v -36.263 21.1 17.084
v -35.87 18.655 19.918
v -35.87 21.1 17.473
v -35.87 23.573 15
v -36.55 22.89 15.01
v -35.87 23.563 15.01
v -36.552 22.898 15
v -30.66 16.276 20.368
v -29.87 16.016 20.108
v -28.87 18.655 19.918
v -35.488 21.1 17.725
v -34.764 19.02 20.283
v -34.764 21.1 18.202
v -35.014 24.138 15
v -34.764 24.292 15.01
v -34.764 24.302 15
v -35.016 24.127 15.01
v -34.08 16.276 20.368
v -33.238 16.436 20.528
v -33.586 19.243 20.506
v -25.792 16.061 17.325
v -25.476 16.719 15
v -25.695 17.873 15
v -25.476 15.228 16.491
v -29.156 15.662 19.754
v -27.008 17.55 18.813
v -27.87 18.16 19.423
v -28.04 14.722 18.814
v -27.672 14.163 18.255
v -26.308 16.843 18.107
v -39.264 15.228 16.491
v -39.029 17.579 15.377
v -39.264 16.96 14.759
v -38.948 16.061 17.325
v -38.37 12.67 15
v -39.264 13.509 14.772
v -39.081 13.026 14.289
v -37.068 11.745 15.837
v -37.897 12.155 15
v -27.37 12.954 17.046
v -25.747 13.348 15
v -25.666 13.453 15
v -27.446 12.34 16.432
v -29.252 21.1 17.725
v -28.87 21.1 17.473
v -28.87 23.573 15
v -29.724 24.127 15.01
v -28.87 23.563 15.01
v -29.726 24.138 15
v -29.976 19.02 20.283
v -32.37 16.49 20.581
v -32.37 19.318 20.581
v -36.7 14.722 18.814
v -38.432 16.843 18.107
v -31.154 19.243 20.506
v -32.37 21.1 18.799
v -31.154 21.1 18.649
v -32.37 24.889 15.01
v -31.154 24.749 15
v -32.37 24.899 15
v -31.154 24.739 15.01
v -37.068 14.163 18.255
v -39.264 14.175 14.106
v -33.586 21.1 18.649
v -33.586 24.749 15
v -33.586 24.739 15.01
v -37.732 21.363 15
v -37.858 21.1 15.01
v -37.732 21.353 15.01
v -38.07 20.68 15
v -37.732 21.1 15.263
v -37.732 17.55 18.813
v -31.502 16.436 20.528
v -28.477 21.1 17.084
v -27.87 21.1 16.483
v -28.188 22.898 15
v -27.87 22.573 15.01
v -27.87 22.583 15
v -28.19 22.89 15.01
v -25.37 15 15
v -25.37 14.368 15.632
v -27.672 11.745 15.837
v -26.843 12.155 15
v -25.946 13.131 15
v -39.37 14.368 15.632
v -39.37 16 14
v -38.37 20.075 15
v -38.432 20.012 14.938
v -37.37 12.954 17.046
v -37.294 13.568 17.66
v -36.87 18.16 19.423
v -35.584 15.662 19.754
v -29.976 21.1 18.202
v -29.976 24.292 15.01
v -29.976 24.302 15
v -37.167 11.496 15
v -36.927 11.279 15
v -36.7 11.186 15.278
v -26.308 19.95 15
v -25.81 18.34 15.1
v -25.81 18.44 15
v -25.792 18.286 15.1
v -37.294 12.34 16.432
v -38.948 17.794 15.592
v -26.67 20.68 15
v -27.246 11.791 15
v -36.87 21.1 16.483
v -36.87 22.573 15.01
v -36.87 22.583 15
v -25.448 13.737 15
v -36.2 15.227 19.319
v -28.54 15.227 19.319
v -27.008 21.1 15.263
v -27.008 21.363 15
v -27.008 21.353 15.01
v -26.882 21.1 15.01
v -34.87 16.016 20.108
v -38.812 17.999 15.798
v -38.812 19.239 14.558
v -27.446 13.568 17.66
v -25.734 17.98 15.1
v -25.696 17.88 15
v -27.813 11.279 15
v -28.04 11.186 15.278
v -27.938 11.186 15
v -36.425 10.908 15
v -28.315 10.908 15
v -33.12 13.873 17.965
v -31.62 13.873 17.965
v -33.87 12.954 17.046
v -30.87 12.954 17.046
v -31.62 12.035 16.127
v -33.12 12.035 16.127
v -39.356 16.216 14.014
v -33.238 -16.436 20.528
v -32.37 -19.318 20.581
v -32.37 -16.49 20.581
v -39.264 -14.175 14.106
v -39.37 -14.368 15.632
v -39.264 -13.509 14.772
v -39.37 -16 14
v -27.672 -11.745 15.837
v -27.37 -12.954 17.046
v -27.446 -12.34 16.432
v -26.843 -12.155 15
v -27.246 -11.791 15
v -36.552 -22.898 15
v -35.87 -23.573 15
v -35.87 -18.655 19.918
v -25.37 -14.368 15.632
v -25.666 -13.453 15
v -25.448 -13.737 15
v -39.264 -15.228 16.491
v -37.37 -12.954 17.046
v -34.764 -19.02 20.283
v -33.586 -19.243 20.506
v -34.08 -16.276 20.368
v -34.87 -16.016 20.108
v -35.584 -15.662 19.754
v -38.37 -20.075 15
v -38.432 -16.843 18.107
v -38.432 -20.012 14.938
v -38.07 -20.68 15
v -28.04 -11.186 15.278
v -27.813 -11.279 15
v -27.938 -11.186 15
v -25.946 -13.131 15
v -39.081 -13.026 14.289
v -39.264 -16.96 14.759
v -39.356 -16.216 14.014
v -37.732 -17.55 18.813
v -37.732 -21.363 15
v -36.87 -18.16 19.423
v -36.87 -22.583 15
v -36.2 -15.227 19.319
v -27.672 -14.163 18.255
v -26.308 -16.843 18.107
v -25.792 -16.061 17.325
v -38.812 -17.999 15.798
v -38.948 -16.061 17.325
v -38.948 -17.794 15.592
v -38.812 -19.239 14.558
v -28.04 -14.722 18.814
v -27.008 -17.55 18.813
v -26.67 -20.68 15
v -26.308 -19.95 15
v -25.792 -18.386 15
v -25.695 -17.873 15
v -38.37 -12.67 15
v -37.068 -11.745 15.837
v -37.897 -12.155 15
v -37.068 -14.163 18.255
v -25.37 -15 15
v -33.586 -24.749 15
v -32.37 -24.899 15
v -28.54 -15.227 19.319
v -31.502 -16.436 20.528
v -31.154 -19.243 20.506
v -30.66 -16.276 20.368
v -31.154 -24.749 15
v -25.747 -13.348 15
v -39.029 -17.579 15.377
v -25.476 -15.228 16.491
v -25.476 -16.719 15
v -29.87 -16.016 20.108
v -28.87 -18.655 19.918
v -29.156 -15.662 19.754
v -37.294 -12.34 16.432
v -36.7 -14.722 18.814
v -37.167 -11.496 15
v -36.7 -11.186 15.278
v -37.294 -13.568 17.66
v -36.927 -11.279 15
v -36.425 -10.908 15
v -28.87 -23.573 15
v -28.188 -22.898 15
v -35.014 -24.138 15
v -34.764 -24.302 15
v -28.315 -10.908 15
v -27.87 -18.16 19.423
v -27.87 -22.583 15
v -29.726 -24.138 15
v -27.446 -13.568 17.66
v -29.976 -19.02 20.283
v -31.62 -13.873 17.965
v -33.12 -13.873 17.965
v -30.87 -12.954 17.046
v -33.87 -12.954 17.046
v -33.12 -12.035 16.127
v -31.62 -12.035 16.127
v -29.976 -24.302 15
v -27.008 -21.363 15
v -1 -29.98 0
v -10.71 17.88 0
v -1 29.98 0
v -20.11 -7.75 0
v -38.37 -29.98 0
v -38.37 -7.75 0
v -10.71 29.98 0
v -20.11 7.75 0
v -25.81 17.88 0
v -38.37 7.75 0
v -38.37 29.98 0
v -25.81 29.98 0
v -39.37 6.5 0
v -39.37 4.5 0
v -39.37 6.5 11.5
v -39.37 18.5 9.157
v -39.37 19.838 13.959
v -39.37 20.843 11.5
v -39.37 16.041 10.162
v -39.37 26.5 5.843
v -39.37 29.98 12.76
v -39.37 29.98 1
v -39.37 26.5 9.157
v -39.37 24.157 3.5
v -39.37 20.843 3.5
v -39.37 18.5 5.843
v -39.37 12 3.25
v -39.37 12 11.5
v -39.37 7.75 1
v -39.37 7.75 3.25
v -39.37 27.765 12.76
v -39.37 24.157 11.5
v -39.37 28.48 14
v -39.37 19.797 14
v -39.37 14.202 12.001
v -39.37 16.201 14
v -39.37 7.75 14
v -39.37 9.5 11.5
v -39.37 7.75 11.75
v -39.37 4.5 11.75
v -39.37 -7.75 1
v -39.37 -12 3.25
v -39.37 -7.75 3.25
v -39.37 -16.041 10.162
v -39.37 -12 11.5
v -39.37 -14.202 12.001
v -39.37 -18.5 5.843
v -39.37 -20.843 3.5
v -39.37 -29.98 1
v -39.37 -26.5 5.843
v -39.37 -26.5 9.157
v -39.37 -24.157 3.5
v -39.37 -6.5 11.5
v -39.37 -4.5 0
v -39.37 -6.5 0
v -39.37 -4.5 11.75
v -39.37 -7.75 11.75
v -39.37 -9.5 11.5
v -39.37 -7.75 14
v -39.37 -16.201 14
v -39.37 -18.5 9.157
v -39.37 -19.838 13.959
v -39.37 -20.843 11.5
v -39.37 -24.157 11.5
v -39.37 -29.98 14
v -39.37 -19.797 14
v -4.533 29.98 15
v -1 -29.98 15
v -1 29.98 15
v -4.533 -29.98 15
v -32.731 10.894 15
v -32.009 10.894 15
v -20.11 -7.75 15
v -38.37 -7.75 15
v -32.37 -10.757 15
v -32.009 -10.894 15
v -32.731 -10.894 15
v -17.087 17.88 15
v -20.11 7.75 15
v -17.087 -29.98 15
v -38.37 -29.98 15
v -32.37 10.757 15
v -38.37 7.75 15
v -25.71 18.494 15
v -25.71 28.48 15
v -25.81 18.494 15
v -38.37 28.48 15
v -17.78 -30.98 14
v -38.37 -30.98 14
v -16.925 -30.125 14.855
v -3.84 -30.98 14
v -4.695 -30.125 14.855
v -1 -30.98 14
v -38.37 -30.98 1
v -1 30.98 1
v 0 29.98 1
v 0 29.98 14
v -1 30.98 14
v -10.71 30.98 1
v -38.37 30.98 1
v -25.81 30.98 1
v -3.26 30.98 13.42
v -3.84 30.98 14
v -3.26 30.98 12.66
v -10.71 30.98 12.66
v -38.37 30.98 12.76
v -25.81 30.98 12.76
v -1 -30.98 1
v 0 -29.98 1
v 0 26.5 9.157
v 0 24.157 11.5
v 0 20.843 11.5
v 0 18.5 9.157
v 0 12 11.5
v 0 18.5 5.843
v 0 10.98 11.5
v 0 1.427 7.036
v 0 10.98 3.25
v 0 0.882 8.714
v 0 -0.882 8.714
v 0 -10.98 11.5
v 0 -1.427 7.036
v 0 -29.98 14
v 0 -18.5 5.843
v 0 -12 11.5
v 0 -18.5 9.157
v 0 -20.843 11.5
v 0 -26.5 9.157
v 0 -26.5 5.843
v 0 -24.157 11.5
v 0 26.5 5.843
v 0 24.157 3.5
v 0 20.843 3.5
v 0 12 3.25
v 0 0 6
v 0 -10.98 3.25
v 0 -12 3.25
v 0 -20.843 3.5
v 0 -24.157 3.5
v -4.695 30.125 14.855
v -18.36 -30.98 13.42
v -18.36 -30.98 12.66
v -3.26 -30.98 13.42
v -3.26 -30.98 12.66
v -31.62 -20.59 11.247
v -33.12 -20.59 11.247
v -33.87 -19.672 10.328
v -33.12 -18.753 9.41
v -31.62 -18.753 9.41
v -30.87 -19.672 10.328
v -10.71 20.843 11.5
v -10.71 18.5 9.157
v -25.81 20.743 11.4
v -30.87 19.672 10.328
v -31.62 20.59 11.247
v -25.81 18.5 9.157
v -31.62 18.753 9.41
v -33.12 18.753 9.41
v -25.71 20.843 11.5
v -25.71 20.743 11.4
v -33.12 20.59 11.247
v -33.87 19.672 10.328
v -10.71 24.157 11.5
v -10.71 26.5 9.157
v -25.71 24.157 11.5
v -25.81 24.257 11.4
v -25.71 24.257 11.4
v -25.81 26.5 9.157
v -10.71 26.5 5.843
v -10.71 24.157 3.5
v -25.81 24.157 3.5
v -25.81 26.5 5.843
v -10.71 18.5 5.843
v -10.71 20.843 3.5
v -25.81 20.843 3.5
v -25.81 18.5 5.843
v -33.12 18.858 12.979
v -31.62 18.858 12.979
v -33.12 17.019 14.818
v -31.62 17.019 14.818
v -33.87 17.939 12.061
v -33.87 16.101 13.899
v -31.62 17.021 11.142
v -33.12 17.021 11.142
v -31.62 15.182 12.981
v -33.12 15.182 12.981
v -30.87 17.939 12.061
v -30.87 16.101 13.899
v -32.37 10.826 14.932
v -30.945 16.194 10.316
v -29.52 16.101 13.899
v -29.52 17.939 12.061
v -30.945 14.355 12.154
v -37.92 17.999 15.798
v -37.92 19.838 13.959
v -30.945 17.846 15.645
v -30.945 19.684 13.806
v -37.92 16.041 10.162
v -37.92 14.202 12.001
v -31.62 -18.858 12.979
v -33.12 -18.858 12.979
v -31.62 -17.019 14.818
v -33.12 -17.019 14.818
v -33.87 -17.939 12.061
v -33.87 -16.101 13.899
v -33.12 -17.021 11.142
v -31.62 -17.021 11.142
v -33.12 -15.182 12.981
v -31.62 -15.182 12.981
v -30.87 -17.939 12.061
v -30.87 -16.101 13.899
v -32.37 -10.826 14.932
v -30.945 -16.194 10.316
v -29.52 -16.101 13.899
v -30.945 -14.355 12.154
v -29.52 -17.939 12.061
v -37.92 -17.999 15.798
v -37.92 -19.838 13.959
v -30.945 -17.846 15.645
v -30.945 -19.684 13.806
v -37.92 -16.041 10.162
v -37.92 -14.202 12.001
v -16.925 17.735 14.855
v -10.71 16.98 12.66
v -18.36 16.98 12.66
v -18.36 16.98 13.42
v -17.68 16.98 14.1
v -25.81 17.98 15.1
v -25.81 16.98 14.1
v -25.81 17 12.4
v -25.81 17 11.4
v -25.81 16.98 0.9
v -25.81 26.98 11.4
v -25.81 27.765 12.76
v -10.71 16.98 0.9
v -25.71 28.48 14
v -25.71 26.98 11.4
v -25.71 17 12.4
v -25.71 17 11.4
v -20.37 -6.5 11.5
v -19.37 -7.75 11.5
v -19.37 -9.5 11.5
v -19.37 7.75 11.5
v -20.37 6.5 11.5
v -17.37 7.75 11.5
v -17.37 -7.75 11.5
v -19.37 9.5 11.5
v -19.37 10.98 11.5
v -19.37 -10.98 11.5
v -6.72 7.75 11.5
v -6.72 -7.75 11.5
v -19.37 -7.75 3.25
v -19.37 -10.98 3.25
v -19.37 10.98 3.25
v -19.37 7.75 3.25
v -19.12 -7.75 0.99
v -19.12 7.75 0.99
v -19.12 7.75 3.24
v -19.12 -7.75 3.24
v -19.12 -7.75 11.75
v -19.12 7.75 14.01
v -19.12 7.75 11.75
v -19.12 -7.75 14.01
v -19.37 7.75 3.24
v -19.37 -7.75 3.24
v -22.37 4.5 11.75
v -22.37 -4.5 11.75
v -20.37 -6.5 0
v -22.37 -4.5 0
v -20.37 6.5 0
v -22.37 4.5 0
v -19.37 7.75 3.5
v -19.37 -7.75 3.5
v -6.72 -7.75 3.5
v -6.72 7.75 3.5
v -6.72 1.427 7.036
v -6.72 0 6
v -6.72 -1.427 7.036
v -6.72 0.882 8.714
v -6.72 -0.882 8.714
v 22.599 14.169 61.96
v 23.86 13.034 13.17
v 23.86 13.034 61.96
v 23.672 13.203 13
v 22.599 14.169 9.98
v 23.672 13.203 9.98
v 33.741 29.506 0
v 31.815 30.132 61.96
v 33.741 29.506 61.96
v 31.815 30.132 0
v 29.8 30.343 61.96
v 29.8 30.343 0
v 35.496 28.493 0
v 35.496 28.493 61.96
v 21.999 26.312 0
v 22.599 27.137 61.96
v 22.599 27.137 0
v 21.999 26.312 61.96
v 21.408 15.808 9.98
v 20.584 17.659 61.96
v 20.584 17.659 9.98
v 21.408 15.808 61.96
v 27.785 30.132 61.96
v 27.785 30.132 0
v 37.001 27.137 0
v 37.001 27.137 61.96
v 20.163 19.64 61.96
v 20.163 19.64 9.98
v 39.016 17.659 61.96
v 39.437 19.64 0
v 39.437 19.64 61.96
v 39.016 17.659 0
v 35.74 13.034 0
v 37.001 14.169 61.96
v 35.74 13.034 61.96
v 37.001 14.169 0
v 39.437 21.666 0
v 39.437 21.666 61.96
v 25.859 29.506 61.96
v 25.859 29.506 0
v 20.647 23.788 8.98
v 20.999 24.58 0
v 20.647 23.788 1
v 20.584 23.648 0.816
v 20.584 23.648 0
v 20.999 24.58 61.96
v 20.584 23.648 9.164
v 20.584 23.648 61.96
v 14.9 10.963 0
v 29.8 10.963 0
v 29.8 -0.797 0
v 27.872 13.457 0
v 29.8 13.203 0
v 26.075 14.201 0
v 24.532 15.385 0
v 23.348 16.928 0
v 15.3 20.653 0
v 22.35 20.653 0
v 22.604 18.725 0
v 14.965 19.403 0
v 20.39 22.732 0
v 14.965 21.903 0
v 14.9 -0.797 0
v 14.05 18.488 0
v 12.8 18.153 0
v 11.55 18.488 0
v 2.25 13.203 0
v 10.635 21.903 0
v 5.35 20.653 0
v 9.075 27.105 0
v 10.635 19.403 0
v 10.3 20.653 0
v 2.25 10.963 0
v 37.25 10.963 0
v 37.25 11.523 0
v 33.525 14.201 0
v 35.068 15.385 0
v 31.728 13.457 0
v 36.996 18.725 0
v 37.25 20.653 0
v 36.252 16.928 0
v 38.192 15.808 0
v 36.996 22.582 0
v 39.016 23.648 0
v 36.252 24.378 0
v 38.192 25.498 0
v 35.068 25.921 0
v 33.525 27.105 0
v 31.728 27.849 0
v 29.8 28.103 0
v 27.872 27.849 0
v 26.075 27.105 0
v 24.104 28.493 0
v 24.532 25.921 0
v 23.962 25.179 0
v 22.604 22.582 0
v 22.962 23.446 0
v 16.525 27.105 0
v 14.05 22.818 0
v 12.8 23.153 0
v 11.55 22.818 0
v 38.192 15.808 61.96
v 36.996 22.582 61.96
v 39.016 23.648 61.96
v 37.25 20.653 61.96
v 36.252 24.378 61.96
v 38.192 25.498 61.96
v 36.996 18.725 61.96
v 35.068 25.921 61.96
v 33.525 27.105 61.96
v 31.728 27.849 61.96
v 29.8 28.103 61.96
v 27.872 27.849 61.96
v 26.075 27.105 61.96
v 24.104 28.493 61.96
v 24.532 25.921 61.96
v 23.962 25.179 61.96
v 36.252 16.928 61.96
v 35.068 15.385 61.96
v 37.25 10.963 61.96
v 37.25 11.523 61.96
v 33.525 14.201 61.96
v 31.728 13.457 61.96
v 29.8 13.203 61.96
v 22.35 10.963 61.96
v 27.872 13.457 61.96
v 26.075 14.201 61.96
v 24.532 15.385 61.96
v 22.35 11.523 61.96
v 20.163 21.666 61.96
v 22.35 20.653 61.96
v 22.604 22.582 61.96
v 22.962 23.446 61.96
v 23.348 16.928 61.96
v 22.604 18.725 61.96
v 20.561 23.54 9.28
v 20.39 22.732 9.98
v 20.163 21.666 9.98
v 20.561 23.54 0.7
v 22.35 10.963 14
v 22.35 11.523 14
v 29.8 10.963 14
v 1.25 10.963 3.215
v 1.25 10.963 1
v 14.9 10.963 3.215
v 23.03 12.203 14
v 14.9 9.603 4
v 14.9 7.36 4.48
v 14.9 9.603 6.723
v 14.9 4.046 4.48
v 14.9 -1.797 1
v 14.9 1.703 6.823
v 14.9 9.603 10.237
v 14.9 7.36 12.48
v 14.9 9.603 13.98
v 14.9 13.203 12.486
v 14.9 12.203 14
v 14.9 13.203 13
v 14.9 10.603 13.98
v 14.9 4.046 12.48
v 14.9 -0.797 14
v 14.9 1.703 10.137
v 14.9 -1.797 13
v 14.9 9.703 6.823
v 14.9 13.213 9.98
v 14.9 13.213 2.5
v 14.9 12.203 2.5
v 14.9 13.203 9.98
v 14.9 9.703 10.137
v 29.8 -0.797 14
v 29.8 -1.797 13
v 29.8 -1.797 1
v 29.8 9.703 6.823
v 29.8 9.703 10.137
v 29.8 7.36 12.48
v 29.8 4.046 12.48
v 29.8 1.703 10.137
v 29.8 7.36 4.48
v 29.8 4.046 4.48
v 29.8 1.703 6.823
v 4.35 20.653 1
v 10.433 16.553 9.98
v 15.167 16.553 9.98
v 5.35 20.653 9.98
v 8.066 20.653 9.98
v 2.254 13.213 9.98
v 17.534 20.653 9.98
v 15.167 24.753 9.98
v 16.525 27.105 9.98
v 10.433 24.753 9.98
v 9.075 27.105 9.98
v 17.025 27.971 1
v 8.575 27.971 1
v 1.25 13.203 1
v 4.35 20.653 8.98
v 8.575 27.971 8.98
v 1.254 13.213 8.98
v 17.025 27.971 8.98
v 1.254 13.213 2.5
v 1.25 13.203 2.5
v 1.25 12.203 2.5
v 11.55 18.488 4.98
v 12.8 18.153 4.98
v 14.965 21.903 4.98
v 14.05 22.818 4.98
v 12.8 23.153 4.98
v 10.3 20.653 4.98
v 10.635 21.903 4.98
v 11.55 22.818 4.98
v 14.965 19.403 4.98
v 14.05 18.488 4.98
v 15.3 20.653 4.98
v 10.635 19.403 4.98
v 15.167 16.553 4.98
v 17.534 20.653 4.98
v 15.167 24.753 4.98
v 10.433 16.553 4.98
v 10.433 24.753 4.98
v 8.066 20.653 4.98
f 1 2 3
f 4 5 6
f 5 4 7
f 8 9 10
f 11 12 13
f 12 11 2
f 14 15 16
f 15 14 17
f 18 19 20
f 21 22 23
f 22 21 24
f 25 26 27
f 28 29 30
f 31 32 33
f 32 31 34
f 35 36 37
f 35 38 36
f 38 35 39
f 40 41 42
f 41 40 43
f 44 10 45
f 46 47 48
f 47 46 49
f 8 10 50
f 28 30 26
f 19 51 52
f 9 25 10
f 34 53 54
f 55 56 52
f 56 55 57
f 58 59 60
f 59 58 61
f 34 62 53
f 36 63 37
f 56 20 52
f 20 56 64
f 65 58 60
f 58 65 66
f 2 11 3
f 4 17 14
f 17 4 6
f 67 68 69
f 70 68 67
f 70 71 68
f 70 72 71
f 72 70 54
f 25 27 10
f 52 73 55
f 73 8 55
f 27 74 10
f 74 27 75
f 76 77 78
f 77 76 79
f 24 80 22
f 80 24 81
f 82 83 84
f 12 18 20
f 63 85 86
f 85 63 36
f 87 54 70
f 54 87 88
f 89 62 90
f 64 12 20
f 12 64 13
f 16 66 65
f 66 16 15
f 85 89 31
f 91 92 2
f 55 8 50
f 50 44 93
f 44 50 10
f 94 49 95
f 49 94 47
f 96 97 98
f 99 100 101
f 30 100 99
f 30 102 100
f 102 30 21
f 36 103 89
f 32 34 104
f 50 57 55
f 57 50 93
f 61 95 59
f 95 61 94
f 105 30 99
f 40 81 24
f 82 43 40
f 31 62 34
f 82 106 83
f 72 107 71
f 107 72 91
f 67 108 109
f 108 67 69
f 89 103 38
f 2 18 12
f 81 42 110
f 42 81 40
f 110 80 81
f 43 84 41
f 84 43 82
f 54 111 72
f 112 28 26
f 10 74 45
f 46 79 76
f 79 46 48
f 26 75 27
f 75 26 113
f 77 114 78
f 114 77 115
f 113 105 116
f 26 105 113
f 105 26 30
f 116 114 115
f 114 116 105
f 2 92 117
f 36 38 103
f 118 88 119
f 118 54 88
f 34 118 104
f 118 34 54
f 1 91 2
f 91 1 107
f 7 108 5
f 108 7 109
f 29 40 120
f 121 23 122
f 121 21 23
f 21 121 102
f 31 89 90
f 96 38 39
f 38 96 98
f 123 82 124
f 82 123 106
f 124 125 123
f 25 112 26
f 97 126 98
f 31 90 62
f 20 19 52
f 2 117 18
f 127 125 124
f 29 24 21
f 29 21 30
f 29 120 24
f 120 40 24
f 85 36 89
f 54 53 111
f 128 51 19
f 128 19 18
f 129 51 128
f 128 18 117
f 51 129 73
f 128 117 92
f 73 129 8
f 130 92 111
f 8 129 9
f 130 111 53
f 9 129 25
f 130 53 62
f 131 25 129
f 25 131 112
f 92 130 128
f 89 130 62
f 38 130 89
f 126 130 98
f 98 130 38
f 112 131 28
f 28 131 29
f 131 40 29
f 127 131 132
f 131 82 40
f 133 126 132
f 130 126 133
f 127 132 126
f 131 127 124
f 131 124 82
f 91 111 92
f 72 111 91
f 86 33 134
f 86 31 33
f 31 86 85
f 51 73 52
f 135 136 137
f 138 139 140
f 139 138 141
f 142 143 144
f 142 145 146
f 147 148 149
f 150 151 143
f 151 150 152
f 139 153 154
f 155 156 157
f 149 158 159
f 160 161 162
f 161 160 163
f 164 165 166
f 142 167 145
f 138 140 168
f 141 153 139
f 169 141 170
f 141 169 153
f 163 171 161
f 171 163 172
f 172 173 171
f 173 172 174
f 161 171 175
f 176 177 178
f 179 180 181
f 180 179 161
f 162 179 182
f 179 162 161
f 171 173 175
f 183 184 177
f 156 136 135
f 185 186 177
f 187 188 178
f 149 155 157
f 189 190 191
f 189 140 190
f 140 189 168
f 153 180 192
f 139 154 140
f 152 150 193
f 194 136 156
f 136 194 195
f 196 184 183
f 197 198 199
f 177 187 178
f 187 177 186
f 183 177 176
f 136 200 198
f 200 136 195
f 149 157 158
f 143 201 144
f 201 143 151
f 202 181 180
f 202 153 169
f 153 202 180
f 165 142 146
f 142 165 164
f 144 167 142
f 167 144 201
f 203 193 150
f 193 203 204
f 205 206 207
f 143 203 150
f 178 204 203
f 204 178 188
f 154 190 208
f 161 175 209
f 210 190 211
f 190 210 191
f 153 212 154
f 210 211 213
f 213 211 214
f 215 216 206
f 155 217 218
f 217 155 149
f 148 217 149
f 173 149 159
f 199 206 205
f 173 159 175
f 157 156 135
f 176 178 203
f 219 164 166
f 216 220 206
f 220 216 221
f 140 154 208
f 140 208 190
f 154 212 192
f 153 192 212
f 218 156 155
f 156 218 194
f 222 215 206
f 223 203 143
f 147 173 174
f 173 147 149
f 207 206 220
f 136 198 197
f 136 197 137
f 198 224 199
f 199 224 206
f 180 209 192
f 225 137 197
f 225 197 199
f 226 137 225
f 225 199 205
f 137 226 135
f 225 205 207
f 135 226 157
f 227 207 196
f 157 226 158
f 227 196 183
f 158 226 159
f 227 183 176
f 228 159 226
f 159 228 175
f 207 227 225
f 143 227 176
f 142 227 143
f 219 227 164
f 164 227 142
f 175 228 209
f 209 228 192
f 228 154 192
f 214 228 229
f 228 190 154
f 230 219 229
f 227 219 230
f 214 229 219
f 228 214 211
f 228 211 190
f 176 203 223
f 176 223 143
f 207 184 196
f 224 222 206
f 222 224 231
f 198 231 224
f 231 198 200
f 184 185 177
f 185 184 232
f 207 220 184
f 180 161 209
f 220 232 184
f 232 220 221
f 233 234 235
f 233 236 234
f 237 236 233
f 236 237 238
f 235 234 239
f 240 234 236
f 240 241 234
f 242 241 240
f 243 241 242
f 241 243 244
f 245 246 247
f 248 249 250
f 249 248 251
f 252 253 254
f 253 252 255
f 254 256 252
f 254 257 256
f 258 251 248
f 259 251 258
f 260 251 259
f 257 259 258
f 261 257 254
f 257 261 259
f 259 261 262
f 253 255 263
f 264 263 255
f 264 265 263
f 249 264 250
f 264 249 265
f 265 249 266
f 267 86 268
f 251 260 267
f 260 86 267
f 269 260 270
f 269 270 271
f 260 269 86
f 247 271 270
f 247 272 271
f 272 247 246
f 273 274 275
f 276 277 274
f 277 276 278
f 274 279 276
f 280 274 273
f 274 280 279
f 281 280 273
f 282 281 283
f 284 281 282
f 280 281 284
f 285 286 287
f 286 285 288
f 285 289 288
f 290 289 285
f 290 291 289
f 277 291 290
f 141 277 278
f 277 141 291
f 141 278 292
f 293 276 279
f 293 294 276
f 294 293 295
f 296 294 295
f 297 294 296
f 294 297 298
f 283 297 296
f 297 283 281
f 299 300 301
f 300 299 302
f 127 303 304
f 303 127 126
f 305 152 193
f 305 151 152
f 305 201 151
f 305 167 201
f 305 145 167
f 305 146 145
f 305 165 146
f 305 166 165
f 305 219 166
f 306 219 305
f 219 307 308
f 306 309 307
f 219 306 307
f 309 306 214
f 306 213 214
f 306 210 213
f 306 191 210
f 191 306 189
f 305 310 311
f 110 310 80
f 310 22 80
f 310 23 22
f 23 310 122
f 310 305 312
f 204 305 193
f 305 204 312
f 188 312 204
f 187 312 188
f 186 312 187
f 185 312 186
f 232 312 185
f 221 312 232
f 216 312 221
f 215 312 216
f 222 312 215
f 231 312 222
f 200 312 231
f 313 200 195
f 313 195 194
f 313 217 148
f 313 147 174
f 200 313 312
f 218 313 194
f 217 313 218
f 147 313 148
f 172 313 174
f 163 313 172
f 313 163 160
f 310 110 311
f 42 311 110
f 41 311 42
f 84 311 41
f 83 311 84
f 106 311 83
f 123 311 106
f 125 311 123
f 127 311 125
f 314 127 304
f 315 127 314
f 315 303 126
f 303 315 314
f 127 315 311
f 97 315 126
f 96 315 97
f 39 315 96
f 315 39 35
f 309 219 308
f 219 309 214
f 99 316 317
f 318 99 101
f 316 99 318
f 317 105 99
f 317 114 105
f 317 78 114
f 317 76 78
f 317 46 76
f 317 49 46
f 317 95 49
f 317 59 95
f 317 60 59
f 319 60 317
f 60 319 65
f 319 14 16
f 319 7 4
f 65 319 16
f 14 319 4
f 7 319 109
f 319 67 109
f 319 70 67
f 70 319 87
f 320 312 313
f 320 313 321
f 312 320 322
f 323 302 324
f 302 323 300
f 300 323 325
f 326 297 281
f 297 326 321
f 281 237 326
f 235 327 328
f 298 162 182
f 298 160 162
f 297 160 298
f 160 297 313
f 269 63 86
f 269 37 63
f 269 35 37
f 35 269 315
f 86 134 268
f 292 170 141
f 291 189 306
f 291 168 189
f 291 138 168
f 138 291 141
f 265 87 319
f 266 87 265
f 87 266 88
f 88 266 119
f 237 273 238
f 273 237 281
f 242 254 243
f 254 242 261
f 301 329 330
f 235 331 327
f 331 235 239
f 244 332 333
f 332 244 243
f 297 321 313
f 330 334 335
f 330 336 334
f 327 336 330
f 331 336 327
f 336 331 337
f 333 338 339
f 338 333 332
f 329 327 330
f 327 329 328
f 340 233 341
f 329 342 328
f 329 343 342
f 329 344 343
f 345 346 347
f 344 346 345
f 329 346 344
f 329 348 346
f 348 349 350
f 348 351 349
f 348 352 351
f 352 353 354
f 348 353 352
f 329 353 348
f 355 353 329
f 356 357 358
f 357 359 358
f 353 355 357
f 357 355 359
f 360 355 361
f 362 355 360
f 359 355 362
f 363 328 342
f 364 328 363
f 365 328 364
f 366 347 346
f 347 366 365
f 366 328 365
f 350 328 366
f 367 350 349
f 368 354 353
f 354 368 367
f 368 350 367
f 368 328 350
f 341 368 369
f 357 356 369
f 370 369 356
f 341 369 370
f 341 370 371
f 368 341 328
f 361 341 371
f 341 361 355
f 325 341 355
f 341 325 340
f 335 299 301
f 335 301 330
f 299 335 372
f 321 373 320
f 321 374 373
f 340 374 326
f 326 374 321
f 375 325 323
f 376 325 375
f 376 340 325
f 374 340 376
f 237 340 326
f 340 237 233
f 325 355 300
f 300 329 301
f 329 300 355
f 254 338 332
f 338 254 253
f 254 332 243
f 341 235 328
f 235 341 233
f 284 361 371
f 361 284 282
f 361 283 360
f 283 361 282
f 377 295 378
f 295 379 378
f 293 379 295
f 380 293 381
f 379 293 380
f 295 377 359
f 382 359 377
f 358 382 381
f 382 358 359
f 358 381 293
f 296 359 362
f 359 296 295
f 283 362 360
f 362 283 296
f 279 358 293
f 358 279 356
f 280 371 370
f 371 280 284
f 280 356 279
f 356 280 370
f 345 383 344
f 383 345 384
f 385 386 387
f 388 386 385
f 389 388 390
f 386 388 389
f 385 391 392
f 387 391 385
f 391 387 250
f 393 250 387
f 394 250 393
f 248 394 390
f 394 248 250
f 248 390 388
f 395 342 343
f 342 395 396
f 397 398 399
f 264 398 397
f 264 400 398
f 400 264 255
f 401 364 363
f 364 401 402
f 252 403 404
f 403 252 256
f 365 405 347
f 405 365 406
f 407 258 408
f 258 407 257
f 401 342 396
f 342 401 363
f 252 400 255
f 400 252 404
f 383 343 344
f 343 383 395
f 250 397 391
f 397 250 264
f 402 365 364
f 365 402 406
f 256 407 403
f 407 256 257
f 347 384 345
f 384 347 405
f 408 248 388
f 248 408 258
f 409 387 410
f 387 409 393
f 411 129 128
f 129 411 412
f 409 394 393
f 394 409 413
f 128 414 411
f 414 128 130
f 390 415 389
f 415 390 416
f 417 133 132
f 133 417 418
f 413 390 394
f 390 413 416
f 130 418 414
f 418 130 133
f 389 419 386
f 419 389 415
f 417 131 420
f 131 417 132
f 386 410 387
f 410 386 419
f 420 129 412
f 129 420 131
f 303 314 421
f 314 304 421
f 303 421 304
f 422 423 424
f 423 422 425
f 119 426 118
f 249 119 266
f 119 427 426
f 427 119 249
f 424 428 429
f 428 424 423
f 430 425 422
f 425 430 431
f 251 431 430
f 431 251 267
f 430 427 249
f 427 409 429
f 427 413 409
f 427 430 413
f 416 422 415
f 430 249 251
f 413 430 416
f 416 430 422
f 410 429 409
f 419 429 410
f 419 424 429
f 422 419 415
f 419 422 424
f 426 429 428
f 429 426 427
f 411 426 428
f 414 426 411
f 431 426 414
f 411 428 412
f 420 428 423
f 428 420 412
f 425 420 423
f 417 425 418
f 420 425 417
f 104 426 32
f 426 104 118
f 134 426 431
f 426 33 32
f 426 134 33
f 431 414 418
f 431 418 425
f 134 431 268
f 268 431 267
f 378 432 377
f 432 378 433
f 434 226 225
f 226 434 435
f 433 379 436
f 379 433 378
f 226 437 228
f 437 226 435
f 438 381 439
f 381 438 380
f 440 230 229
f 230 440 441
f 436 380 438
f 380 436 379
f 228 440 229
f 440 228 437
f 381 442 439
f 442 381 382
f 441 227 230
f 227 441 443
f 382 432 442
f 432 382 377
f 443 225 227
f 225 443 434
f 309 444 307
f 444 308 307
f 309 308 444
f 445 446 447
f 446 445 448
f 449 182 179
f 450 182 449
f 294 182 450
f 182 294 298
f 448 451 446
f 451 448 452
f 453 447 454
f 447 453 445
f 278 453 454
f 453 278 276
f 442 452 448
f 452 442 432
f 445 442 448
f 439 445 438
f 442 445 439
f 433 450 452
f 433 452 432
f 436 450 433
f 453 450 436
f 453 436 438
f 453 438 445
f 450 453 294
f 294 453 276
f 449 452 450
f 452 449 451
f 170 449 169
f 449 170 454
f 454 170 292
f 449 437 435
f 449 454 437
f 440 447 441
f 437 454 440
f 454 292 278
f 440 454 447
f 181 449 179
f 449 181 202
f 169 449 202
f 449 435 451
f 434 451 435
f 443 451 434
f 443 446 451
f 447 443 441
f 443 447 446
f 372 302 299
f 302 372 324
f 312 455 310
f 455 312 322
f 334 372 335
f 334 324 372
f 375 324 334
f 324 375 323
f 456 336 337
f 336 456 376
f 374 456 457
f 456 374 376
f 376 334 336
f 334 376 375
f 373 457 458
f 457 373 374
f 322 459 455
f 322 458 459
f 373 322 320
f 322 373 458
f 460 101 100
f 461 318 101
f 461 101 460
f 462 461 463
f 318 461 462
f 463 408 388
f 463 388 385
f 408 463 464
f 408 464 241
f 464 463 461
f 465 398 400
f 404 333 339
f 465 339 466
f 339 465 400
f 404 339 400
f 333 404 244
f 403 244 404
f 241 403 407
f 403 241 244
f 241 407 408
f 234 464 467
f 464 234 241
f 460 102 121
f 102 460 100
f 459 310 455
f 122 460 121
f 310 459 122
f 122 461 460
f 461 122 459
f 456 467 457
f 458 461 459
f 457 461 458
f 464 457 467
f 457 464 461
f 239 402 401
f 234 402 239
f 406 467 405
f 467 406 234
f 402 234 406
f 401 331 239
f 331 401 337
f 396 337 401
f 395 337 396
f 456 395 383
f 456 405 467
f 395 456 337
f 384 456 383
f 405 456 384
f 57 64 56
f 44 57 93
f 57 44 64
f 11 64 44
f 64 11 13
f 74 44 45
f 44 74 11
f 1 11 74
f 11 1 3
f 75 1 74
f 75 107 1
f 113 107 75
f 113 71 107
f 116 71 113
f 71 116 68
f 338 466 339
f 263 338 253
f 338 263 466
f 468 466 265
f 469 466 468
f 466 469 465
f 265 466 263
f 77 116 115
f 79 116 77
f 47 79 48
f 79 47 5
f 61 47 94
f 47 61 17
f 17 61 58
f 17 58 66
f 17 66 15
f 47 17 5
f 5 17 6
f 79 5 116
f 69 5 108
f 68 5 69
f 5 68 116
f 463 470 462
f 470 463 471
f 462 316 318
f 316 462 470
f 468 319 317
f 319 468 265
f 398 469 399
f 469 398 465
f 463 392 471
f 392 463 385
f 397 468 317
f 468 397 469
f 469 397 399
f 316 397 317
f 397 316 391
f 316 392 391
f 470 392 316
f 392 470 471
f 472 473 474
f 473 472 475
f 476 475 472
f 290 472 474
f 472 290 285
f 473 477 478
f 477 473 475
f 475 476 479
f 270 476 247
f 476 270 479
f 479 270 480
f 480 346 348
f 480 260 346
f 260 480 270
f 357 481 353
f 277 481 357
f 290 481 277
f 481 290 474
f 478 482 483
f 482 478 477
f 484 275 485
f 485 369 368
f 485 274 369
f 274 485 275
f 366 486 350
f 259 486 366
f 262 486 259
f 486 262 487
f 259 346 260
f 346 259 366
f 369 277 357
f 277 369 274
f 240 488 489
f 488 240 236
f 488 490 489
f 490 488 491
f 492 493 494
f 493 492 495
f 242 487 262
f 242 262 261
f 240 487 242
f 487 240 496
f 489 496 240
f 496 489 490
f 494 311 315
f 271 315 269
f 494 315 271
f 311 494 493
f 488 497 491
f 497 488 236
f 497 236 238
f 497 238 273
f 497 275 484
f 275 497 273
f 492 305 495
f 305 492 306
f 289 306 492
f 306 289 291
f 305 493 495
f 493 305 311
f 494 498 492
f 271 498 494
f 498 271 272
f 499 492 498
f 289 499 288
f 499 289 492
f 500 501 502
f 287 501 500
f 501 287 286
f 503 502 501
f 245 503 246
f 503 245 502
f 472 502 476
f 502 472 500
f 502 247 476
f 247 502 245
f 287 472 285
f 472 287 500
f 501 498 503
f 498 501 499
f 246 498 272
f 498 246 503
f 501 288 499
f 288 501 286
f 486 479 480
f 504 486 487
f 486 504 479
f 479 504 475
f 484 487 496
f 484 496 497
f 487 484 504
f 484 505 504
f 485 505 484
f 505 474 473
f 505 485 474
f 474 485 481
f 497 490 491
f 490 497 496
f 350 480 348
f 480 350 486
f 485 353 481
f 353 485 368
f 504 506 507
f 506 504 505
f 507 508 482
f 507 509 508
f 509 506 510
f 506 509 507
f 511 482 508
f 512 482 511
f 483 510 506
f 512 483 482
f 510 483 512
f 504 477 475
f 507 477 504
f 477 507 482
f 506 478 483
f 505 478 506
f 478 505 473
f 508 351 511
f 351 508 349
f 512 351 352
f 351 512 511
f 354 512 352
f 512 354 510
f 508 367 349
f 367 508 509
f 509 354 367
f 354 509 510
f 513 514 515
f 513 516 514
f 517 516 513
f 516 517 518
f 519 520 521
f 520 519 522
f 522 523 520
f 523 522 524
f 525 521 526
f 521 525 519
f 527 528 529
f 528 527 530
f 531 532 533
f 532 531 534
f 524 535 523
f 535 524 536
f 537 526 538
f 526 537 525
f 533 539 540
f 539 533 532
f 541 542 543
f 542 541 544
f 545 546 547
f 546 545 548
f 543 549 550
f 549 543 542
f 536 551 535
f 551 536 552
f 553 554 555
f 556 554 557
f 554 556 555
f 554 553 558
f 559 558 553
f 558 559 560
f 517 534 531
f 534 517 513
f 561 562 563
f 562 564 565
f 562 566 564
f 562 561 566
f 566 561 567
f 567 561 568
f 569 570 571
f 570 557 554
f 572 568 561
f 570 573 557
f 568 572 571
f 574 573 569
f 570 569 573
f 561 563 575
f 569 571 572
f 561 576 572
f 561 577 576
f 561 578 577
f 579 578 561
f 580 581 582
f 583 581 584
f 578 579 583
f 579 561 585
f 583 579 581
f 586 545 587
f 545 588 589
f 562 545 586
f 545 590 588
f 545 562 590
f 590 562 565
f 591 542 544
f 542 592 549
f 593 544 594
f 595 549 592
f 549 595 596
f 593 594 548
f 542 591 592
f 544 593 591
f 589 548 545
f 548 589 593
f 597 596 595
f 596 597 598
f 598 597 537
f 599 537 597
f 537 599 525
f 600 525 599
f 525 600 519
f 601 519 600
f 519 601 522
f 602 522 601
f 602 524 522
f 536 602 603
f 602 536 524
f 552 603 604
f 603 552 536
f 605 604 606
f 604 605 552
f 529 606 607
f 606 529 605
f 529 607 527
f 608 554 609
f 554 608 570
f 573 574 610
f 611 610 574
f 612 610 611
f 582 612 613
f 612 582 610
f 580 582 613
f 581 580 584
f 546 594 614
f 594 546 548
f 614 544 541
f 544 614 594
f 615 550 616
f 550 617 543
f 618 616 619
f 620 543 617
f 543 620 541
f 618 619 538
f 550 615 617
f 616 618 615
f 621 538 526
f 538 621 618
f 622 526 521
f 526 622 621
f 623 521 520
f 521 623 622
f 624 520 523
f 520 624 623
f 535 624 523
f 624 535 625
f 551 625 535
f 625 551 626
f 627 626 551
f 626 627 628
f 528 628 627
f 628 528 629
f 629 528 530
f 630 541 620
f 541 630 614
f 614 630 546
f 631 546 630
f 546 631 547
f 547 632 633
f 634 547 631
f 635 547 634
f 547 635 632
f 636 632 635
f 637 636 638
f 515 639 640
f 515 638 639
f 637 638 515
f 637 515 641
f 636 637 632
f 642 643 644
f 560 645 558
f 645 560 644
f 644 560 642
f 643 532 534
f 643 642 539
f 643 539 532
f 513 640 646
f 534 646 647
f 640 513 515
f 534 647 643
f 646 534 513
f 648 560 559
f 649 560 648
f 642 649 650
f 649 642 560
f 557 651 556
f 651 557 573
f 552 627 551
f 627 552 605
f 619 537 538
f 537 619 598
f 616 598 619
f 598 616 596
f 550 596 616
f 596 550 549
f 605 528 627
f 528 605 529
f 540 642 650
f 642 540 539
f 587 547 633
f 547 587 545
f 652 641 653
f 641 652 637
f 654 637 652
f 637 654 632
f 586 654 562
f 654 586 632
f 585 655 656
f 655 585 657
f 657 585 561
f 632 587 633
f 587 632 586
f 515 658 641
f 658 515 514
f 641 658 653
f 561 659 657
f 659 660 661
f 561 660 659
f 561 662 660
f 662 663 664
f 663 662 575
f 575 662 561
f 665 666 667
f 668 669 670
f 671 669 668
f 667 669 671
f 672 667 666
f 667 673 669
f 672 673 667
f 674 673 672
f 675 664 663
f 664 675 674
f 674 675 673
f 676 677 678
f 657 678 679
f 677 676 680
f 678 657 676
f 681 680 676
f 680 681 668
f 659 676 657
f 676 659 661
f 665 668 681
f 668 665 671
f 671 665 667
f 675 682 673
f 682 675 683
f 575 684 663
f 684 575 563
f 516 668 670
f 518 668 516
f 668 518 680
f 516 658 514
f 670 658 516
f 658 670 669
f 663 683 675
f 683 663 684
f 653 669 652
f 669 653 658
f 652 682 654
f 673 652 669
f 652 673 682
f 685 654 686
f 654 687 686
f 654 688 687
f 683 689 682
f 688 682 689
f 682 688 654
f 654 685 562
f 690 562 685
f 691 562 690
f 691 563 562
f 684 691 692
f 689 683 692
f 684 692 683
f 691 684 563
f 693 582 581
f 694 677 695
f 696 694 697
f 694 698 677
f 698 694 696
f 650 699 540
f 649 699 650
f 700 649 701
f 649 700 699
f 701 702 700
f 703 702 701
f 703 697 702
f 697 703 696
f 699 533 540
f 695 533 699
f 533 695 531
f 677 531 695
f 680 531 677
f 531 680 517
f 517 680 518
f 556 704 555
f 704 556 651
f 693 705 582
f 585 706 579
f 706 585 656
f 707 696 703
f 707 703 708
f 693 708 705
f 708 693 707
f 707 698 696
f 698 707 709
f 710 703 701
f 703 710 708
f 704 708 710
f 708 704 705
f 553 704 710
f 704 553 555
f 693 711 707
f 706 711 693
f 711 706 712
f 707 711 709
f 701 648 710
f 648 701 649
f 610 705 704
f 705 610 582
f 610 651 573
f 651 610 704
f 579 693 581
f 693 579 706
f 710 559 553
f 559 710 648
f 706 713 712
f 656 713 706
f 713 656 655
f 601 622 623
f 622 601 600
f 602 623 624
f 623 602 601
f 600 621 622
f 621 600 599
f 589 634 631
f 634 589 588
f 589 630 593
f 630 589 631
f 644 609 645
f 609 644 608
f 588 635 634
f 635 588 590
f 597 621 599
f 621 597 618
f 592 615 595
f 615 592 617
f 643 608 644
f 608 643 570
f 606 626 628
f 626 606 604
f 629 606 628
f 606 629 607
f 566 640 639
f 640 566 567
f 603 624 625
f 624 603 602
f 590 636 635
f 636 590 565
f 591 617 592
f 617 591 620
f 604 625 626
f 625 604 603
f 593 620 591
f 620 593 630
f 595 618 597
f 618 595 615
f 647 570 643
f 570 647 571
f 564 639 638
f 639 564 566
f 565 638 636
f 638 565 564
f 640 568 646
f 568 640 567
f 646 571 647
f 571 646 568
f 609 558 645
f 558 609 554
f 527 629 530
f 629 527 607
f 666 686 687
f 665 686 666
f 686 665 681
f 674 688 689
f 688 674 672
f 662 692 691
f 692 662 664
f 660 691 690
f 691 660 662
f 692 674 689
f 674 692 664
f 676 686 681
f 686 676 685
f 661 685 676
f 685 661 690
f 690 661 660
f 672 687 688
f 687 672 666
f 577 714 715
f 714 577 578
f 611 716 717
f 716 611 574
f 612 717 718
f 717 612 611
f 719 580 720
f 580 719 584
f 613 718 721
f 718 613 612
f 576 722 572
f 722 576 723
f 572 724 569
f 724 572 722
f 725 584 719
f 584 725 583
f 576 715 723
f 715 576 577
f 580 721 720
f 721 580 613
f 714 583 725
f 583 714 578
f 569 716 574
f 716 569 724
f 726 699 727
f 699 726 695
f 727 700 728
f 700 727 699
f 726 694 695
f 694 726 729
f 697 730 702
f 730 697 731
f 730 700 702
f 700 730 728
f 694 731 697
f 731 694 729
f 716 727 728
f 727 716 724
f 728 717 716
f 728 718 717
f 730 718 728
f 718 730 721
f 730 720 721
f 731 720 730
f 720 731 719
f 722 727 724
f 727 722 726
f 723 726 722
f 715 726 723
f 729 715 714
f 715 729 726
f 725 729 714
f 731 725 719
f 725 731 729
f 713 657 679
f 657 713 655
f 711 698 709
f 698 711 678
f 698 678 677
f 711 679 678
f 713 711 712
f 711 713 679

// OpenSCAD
//////////////////////////////////////////////////////////////////////////////////////
///
///  I3XENDS - Split X-Ends for Prusa i3, with Endstop and Belt Tensioner
///
///  This file contains a redesign of the X-ends for the Prusa i3, including
///  motor end, idler end with belt tensioner and endstop.
///
///  The design goal is to make the X-ends stronger by splitting them into two
///  interlocking parts, printing the Z-axis related part vertically and the
///  X-axis relating part rotated 90 degrees to the back.  This way, each part
///  is printed in its optimal position, resulting in improved object strength
///  and reduced printing difficulties, such as warping and cracking. The two
///  part are joined by means of a trapezoidal slide and are locked firmly
///  together once the upped X-rod is inserted.
///
///  The idler bearing is mounted on a configurable fork which also acts as a
///  belt tensioner, being attached to the left X-end by means of an ajuster bolt.
///  Idler forks for the following bearing are predefined:
///     2x623ZZ, 2x604ZZ, 2x624Z, 2x625ZZ, 1x608ZZ
///
///  The motor X-end contains has the option for integrating a Z-endstop adjustment
///  screw.
///
///  Finally, the X-endstop holder is implemented a separate object which slides
///  on boths X-rods and is maintained firmly in its position bt means of two locking
///  screws.
///
///  The rod channels and screw holes are defined to be tight.  Use a drill with
///  the corresponding diameter to obtain perfectly fitting cavities.
///
//////////////////////////////////////////////////////////////////////////////////////
///
///  2014-10-24 Heinz Spiess, Switzerland
///
///  released under Creative Commons - Attribution - Share Alike licence (CC BY-SA)
//////////////////////////////////////////////////////////////////////////////////////

// extrusion specific parameters
ew = 0.56;    // extrusion width
eh = 0.25;    // layer height
epsgap = 0.1; // gap between complementing parts
wall = [6*ew, 8*ew, 14*eh, 4*ew]; // wall thickness x/y/z/lm8uu


// build a cube with chamfered edges
module chamfered_cube(size,d=[1,1,1]){
   hull(){
     translate([d[0],d[1],0])cube(size-2*[d[0],d[1],0]);
     translate([0,d[1],d[2]])cube(size-2*[0,d[1],d[2]]);
     translate([d[0],0,d[2]])cube(size-2*[d[0],0,d[2]]);
   }
}


// build a cylinder with chamfered edges
module chamfered_cylinder(r=0,r1=0,r2=0,h=0,d=1){
   hull(){
      translate([0,0,d])cylinder(r1=(r?r:r1),r2=(r>0?r:r2),h=h-2*d);
      cylinder(r1=(r?r:r1)-d,r2=(r>0?r:r2)-d,h=h);
   }
}


//////////////////////////////////////////////////////////////////////////////////////
///
///  The module i3_xend() contains all parts of the project as sub-modules. 
///  (This is convenient since this way, the parameters can easily be shared.)
///
//////////////////////////////////////////////////////////////////////////////////////
module i3_xend(motorend=true, idlerend=false, idler=false, bearing=[5,17,11], endstop=false, zcarriage=true, support=true, idlerclamps=false){
xdist = 45;   // distance between x-rods
xrod = 8;     // diameter of x-rods
lm8uu = 14.9;   // diameter of linear bearing;


motor_d = 42; // motor side length (Nema 17)
motor_s = 31; // motor mounting screws spacing

madj = 2.5;   // screw hole for adjuster screw (cut thread with M3 tap)
m3 = 3;       // motor screw diameter
m3n = 5.5;    // M3 nut diameter
m3nh = 2.5;   // M3 nut height
m5 = 5;       // threaded z-rod diameter
m5n = 8.2;    // nut size on threaded x-rod (not too tight!)
m5nh = 5;     // nut height on threaded x-rod
zsrod = 8;    // diameter of smooth z-rod
ztrod = 5;    // diameter of threaded z-rod
zdist = motor_d/2-zsrod/2; // center-to-center distance between z-rods

idl = 20;     // idler length
idg = 0.25;   // gap for idler
ids = m3;      // idler tensioning screw diameter
idn = m3n;    // idler nut diameter
idnh = m3nh;   // idler nut height

xgap = 10-wall[0]-(lm8uu-xrod)/2;    // gap between x-motor and wall

esl = 15;     // endstop length (along x-rods)
esd = 9.5;    // endstop switch screw distance

//  don't change the following, they are just to make code more readble
ml1 = motor_d+xgap;                    // upper length of motor end left of origin
ml2 = lm8uu/2+2*wall[0]+zdist+m5n;      // length of motor end right of origin
ml3 = motor_d/2-motor_s/4-m3+xgap;      // lower length of motor end left of origin
mlz = wall[0]+lm8uu/2;                  // x-position of smooth zrod
d1 = 2*wall[2]+xrod;                    // height of main body
d2 = wall[2]+xrod-1;                    // height of motor base
h1 = xdist+2*wall[1]+xrod;              // total height

itl = ml2-idl-2*wall[0];                // idler tail length
idh = d1;     // idler height
ith = d1;                               // idler tail height
idd = d1;   // idler depth
idc = d1-1;
idca = -45;


///////////////////////////////////////////////////////////////////////////////
// local module for the interlocking Z-carriage part for motor and idler end
///////////////////////////////////////////////////////////////////////////////
module zcarriage(hole=true,l=h1,eps=0){
   translate([0,0,-eps])difference(){
      union(){
         // outer cylinder for linear bearing holder
         cylinder(r=lm8uu/2+wall[3]+eps,h=l+2*eps);
	 // locking rail
         hull(){
            translate([-lm8uu/2-wall[3]-eps,-lm8uu/2-eps,0])cube([ew+2*eps,lm8uu+2*eps,l+2*eps]);
            translate([-lm8uu/2-eps,-lm8uu/2+wall[3]-eps,0])cube([ew+2*eps,lm8uu-2*wall[3]+2*eps,l+2*eps]);
         }
	 // upper x-rod lock
         translate([-lm8uu/2-d1-eps,-lm8uu-eps,0-eps])chamfered_cube([d1+2*eps,lm8uu+2*eps,d1-1+2*eps],[1,0,1]);
	 // nut holder for threaded z-rod
	 hull(){
	   translate([0,-zdist,0])rotate(30)chamfered_cylinder(r=lm8uu/2+1,h=h1/2-motor_d/2,$fn=6);
	   translate([-lm8uu/2-wall[3],-ml2+mlz-eps+0.01,0])chamfered_cube([wall[3],ml2-mlz+2*eps,h1/2-motor_d/2],[0,1,1]);
	 }
      }
      // lock for nut holder
      hull(){
         translate([-lm8uu/2-wall[2]-0.1,-ml2+mlz,wall[2]+0.5+eps])cube([1,ml2-mlz-lm8uu,h1/2-motor_d/2],[0,1,1]);
         translate([-lm8uu/2-1,-ml2+mlz-1,wall[2]-1+eps])cube([1.01,ml2-mlz-lm8uu+1,h1/2-motor_d/2],[0,1,1]);
      }
      // cavities
      if(hole){
         // cavity for linear bearings
         translate([0,0,-1])cylinder(r=lm8uu/2,h=l+2);
	 // longitudinal cutout to allow flexing
         rotate(210)translate([-1,0,-1])cube([2,lm8uu/2+wall[3]+0.1,l+2]);
	 // x-rod hole throu x-rod lock
         translate([-lm8uu/2-d1/2,1,wall[1]+xrod/2])rotate([90,0,0])rotate(22.5)cylinder(r=xrod/2/cos(22.5),h=lm8uu+2,$fn=8);
	 // hole for threaded z-rod
	 //%color("grey")translate([0,-zdist,-1])cylinder(r=m5/2,h=h1+2,$fn=12);
	 translate([0,-zdist,-1])cylinder(r=m5/2,h=h1/2-motor_d/2+2,$fn=12);
	 // nut cavity for threaded z-rod
	 translate([0,-zdist,h1/2-motor_d/2-m5nh])rotate(30)cylinder(r=m5n/2/cos(30),h=m5nh+1,$fn=6);
      }
   }
}


///////////////////////////////////////////////////////////////////////////////
// local module to build the base of the motor end
///////////////////////////////////////////////////////////////////////////////
module motorend(){
difference(){
union(){
difference(){
   union(){
      // main body upper part
      hull(){
         translate([-ml1,-1,0])
            chamfered_cube([ml1+ml2,h1/2+1,d2]);
         translate([-ml3,-1,0])
            chamfered_cube([ml3+ml2,h1/2+1,d1]);
      }
      // main body lower part
      translate([-ml3,-h1/2,0])
         chamfered_cube([ml3+ml2,h1/2+2,d1]);
      // z-adjuster screw base
      if(endstop)
         hull()for(xz=[[0,d1/2,6],[0,d1+lm8uu/2,36],[10,d1-5,6]])
            translate([-motor_d/2-xgap+motor_s/2+xz[0],-h1/2,xz[1]])rotate([-90,0,0])
               chamfered_cylinder(r=motor_s/2-motor_s/4-m3,h=h1/2-motor_d/2,$fn=xz[2]);

   }

   for(sy=[-1,1])scale([1,sy,1]){
      // x-rod holes
      translate([0,xdist/2,d1/2])rotate([0,90,0])rotate(22.5)cylinder(r=xrod/2/cos(22.5),h=ml2+1,$fn=8);
      // holes for motor screws
      for(fx=[-1,1])translate([-xgap-motor_d/2+fx*motor_s/2,motor_s/2,-1]){
         // main screw holes
         cylinder(r=m3/2,h=d2+1,$fn=6);
         // cavities for screw heads
	 translate([0,0,7]) cylinder(r=m3,h=d1+2,$fn=12);
      }
   }
   
   // main belt channel 
   translate([-motor_d-xgap-1,-motor_d/4,wall[2]])
      cube([motor_d+xgap+ml2+2,motor_d/2,xrod]);
   hull(){
      translate([-xgap-wall[0],-motor_d/4,wall[2]])
         cube([xgap+ml2+2,motor_d/2,xrod]);
      translate([0,-motor_s/2+2,wall[2]])
         cube([ml2+2,motor_s-4,xrod]);
   }
   // upper motor cavity
   translate([-motor_d-xgap-1,-motor_d/2,d2])
      cube([motor_d+xgap,motor_d,wall[2]+2]);
   //main cutout for motor
   translate([-motor_d-xgap-1,-motor_d/4,-1])
      cube([motor_d,motor_d/2,wall[2]+xrod+2]);
   // octogonal cutout centered on motor axis
   translate([-xgap-motor_d/2,0,0])hull()for(a=[0,90])rotate(a)
      cube([motor_d/2,motor_s-2,motor_d],true);

    // Z-adjuster screw hole
    if(endstop)
       translate([-motor_d/2-xgap+motor_s/2,-h1/2,d1+lm8uu/2])rotate([-90,0,0])
          translate([0,0,-1])cylinder(r=madj/2,h=h1/2+wall[1]-motor_d/2+2,$fn=6);
}
 
    // belt separating wall 
    translate([0,-wall[1]/2,0])chamfered_cube([ml2,wall[1],d1]);
}
   // cutout for linear bearings holder
    translate([wall[0]+lm8uu/2,h1/2,d1+lm8uu/2])rotate([90,0,0])
       rotate(90){
          zcarriage(hole=false,eps=epsgap);
          if(!support)%color("cyan")zcarriage(hole=true);
       }

}

    if(zcarriage)translate([-motor_d+xgap,0,0])rotate(90)
       zcarriage(hole=true);
}

///////////////////////////////////////////////////////////////////////////////
// local module to build the idler fork for the specified bearing parameters
//    bearing[0]   inner diameter (axis)
//    bearing[1]   outer diameter (incl. belt)
//    bearing[2]   width of bearing (incl. washers)
///////////////////////////////////////////////////////////////////////////////
module idler(){
   assign(idD = bearing[2]+2*wall[2])
   assign(idE = bearing[1]/2)
   difference(){
      union(){
         // main body
	 hull(){
            translate([0,-idd/2,0])chamfered_cube([idl,idd,idh]);
            translate([-idE-2,-idD/2,0])chamfered_cube([idl/2+idE,idD,idh]);
	    // front end
            translate([-idE+1,-idD/2,idh/2])rotate([-90,0,0])rotate(0)chamfered_cylinder(r=idh/2,h=idD);
	 }
	 // tail
         translate([0,-idd/2+wall[2]+epsgap,0])chamfered_cube([ml2-2*wall[0],idd-2*wall[2]-2*epsgap,idh]);
      }
      // hole tensioning screw
      translate([-1,0,d1/2])rotate([0,90,0])rotate(30)cylinder(r=ids/2,h=ml2+2,$fn=6);
      // axis hole
      translate([-idE+bearing[0]/2,-idD/2-1,d1/2])rotate([-90,0,0])cylinder(r=bearing[0]/2,h=idD+2);
      hull(){
         // bearing cavity 
         translate([-idE+2,-bearing[2]/2,d1/2])rotate([-90,0,0])cylinder(r=max(bearing[1],idh/cos(30)+2)/2,h=bearing[2]);
         // main cavity
         translate([-idd-1,-idd/2+wall[1],-1])chamfered_cube([idd+idl-wall[0]+1,idd-2*wall[1],idh+2]);
      }
      // tensioning nut cage
      hull()for(y=[0,xrod])translate([(idl+ml2-3*wall[1])/2,y,d1/2])rotate([0,90,0])
         rotate(30)cylinder(r=idn/2/cos(30)+(y?0.4:0),h=idnh,$fn=6);
   }
     
}

///////////////////////////////////////////////////////////////////////////////
// local module to build the idler X-end
///////////////////////////////////////////////////////////////////////////////
module idlerend(){
   difference(){
      union(){
         // main body
         translate([0,-h1/2,0]) chamfered_cube([ml2,h1,d1]);
	 // idler clamp screws
	 if(idlerclamps)for(sy=[-1,1])scale([1,sy,1]){
	     translate([ml2-idc/2,-xdist/2,d1/2])rotate([idca,0,0])chamfered_cylinder(r=idc/2,h=d1/2+m3nh+wall[2],d=2,$fn=36);
	 }
      }
   
      for(sy=[-1,1])scale([1,sy,1]){
         // x-rod holes
         translate([-1,xdist/2,d1/2])rotate([0,90,0])rotate(22.5)cylinder(r=xrod/2/cos(22.5),h=ml2+2,$fn=8);
      }
      
      // idler clamp screw
      if(idlerclamps)for(sy=[-1,1])scale([1,sy,1])
         translate([ml2-idc/2,-xdist/2,d1/2])rotate([idca,0,0]){
           // idler clamp screw head cavity (if needed)
	   cylinder(r=m3/2,h=d1/2+m3nh+wall[2]+3,$fn=6);
           // idler clamp screw holes
	   translate([0,0,d1/2+m3nh+wall[2]+0.01])cylinder(r=m3,h=d1/2+m3nh+wall[2]+3,$fn=12);
           // idler clamp screw nut traps
	   hull()for(x=[0,idc/2+.1])translate([x,0,xrod/2+wall[2]-1-epsgap/2])
	      cylinder(r=m3n/2+(x?0.35:epsgap),h=m3nh+epsgap,$fn=6);
      }
      // main belt channel 
      translate([-1,-motor_s/2+(idlerclamps?3.5:2),wall[2]-eh])
         cube([ml2+2,motor_s-(idlerclamps?7:4),xrod+eh]);
   
      // idler cut-out
      translate([ml2-idl-idg,-idh/2-idg,-0.01])chamfered_cube([idl+10,idh+2*idg,d1+0.02],[1,0,1]);
   
 
      // cutout for linear bearings holder
      translate([wall[0]+lm8uu/2,h1/2,d1+lm8uu/2])rotate([90,0,0])
         rotate(90){
            zcarriage(hole=false,eps=epsgap);
            if(!support)%color("cyan")zcarriage(hole=true);
         }
   }
   // idler support structure (cut away after printing!)
   if(support)color("red")difference(){
      union(){
         translate([ml2-idl-2,-idh/2-2,d1-wall[2]])cube([idl+2,idh+4,eh]);
         translate([ml2-idl+1,-idh/2+1,0])cube([idl-1,idh-2,d1-wall[2]]);
      }
      translate([ml2-idl+1+2,-idh/2+1+2,-1])cube([idl-1,idh-2-4,d1-wall[2]+2]);
   }else{  // draw idler
      %color("green")translate([ml2+5,idd/2,idh/2])rotate([90,0,0])rotate(180)idler();
   }

   // tail cage for idler fork
   difference(){
      translate([0,-ith/2-wall[1]+(idlerclamps?1:0),wall[2]-eh-0.01])cube([ml2-idl,ith+2*wall[1]-(idlerclamps?2:0),xrod+eh+0.02]);
      translate([2*wall[0],-ith/2-idg,wall[2]])cube([ml2-idl-2*wall[0]+1,ith+2*idg,xrod]);
      translate([-1,0,d1/2])rotate([0,90,0])cylinder(r=ids/2,h=2*wall[0]+2);
   }

    
   // build separate interlocking z-carriage part
   if(zcarriage)translate([-2*lm8uu,h1/3,0]) rotate(90)zcarriage(hole=true);
}

///////////////////////////////////////////////////////////////////////////////
// local module to build the X-endstop
///////////////////////////////////////////////////////////////////////////////
module endstop(){
   difference(){
      union(){
         // main body upper part
         translate([0,-h1/2,0]) chamfered_cube([esl,h1,d1+m3nh+wall[2]]);
      }

      for(sy=[-1,1])scale([1,sy,1]){
         // x-rod holes
         translate([-1,xdist/2,d1/2])rotate([0,90,0])
            rotate(22.5)cylinder(r=xrod/2/cos(22.5),h=esl+2,$fn=8);
         // x-rod nut cavities
         hull()for(x=[0,esl/2])translate([x,xdist/2,d1-1])
            rotate(30)cylinder(r=m3n/2/cos(30)+(x?0.2:0),h=m3nh,$fn=6);
         // x-rod clamping screw holes - lower part
         translate([esl/2,xdist/2,d1-wall[2]])cylinder(r=m3/2,h=wall[2],$fn=6);
         // x-rod clamping screw holes - upper part
         translate([esl/2,xdist/2,d1+m3nh-1+eh])cylinder(r=m3/2,h=wall[2]+2,$fn=6);
         // end switch screw slots
         for(i=[0:1])translate([esl/2-m3/2,i*esd+esd/8,d1+m3nh])
            cube([m3,0.75*esd,wall[2]+1]);
         translate([esl/2,-xdist/2+xrod/2+wall[1]+0.5,0])cylinder(r1=0,r2=m3+1,h=d1+m3nh-0.01);
      }
         
      // belt channel 
      translate([-1,-xdist/2+xrod/2+wall[1],-1])
         cube([ml2+2,xdist-xrod-2*wall[1],xrod+2*wall[2]+m3nh+1]);
      translate([esl/2-m3/2,-motor_s/2,d1+m3nh-eh])
         cube([m3,motor_s,3*eh]);
   }
   // bridging support  
   if(support)color("red")hull(){
      translate([2,-2,0])cube([esl-4,4,1]);
      translate([-1,-ew/2,d1+m3nh-1])cube([esl+2,ew,1]);
   }

}
   
//  now build the desired part(s)

if(motorend)motorend();

if(endstop && !motorend)endstop();

if(idlerend)
   scale([-1,1,1])idlerend();
if(idler)
   translate([35,20,0])rotate(180)idler();

if(zcarriage && !motorend && !idlerend && !endstop &&!idler)zcarriage();

}

//////////////////////////////////////////////////////////////////////////////
///  Modules for automatic building of specific STL file via Makefile
//////////////////////////////////////////////////////////////////////////////

module motorxend(){ // AUTO_MAKE_STL
   i3_xend(motorend=true,idlerend=false,idler=false);
}

module motorxend_zendstop(){ // AUTO_MAKE_STL
   i3_xend(motorend=true,idlerend=false,idler=false,endstop=true);
}

module idlerxend(){ // AUTO_MAKE_STL
   i3_xend(motorend=false,idlerend=true,idler=false);
}

module idlerxend_xrodclamps(){ // AUTO_MAKE_STL
   i3_xend(motorend=false,idlerend=true,idler=false,idlerclamps=true);
}

module xendstop(){ // AUTO_MAKE_STL
   i3_xend(motorend=false,idlerend=false,idler=false,endstop=true);
}

module idler2x625(){ // AUTO_MAKE_STL
   i3_xend(motorend=false,idlerend=false,idler=true,bearing=[5,17,11]);
}

module idler2x624(){ // AUTO_MAKE_STL
   i3_xend(motorend=false,idlerend=false,idler=true,bearing=[4,14,11]);
}

module idler2x623(){ // AUTO_MAKE_STL
   i3_xend(motorend=false,idlerend=false,idler=true,bearing=[3,11,9]);
}

module idler2x604(){ // AUTO_MAKE_STL
   i3_xend(motorend=false,idlerend=false,idler=true,bearing=[4,13,9]);
}

module idler608(){ // AUTO_MAKE_STL
   i3_xend(motorend=false,idlerend=false,idler=true,bearing=[8,18,8]);
}

//////////////////////////////////////////////////////////////////////////////
///  Uncomment as needed for manual printing
//////////////////////////////////////////////////////////////////////////////

//i3_xend(motorend=false,idlerend=true,idler=false,support=true,zcarriage=false,idlerclamps=true);
//scale([-1,1,1])i3_xend(motorend=false,idlerend=false,idler=false,support=false,zcarriage=true,idlerclamps=false);
//idlerxend();
//motorxend();
//motorxend_zendstop();
idlerxend_xrodclamps();
//xendstop();
//idler2x625();
//idler2x623();
//idler2x604();
//idler608();
//
/// show all in print position:
//motorxend_zendstop();
//translate([55,0,0])xendstop();
//translate([120,0,0])idlerxend();
//translate([110,-45,0])rotate(180)idler2x604();
//
/// show all in working position:
//rotate(180)translate([30,90,0])
//{translate([-50,0,0])i3_xend(motorend=true,idlerend=false,idler=false,support=false,zcarriage=false);
//translate([85,0,0])i3_xend(motorend=false,idlerend=true,idler=false,support=false,zcarriage=false);
//i3_xend(motorend=false,idlerend=false,endstop=true,support=false,zcarriage=false);}
//translate([-50,0,0])i3_xend(motorend=true,idlerend=false,idler=false,support=false,zcarriage=false);
//translate([85,0,0])i3_xend(motorend=false,idlerend=true,idler=false,support=false,zcarriage=false);
//i3_xend(motorend=false,idlerend=false,endstop=true,support=false,zcarriage=false);
